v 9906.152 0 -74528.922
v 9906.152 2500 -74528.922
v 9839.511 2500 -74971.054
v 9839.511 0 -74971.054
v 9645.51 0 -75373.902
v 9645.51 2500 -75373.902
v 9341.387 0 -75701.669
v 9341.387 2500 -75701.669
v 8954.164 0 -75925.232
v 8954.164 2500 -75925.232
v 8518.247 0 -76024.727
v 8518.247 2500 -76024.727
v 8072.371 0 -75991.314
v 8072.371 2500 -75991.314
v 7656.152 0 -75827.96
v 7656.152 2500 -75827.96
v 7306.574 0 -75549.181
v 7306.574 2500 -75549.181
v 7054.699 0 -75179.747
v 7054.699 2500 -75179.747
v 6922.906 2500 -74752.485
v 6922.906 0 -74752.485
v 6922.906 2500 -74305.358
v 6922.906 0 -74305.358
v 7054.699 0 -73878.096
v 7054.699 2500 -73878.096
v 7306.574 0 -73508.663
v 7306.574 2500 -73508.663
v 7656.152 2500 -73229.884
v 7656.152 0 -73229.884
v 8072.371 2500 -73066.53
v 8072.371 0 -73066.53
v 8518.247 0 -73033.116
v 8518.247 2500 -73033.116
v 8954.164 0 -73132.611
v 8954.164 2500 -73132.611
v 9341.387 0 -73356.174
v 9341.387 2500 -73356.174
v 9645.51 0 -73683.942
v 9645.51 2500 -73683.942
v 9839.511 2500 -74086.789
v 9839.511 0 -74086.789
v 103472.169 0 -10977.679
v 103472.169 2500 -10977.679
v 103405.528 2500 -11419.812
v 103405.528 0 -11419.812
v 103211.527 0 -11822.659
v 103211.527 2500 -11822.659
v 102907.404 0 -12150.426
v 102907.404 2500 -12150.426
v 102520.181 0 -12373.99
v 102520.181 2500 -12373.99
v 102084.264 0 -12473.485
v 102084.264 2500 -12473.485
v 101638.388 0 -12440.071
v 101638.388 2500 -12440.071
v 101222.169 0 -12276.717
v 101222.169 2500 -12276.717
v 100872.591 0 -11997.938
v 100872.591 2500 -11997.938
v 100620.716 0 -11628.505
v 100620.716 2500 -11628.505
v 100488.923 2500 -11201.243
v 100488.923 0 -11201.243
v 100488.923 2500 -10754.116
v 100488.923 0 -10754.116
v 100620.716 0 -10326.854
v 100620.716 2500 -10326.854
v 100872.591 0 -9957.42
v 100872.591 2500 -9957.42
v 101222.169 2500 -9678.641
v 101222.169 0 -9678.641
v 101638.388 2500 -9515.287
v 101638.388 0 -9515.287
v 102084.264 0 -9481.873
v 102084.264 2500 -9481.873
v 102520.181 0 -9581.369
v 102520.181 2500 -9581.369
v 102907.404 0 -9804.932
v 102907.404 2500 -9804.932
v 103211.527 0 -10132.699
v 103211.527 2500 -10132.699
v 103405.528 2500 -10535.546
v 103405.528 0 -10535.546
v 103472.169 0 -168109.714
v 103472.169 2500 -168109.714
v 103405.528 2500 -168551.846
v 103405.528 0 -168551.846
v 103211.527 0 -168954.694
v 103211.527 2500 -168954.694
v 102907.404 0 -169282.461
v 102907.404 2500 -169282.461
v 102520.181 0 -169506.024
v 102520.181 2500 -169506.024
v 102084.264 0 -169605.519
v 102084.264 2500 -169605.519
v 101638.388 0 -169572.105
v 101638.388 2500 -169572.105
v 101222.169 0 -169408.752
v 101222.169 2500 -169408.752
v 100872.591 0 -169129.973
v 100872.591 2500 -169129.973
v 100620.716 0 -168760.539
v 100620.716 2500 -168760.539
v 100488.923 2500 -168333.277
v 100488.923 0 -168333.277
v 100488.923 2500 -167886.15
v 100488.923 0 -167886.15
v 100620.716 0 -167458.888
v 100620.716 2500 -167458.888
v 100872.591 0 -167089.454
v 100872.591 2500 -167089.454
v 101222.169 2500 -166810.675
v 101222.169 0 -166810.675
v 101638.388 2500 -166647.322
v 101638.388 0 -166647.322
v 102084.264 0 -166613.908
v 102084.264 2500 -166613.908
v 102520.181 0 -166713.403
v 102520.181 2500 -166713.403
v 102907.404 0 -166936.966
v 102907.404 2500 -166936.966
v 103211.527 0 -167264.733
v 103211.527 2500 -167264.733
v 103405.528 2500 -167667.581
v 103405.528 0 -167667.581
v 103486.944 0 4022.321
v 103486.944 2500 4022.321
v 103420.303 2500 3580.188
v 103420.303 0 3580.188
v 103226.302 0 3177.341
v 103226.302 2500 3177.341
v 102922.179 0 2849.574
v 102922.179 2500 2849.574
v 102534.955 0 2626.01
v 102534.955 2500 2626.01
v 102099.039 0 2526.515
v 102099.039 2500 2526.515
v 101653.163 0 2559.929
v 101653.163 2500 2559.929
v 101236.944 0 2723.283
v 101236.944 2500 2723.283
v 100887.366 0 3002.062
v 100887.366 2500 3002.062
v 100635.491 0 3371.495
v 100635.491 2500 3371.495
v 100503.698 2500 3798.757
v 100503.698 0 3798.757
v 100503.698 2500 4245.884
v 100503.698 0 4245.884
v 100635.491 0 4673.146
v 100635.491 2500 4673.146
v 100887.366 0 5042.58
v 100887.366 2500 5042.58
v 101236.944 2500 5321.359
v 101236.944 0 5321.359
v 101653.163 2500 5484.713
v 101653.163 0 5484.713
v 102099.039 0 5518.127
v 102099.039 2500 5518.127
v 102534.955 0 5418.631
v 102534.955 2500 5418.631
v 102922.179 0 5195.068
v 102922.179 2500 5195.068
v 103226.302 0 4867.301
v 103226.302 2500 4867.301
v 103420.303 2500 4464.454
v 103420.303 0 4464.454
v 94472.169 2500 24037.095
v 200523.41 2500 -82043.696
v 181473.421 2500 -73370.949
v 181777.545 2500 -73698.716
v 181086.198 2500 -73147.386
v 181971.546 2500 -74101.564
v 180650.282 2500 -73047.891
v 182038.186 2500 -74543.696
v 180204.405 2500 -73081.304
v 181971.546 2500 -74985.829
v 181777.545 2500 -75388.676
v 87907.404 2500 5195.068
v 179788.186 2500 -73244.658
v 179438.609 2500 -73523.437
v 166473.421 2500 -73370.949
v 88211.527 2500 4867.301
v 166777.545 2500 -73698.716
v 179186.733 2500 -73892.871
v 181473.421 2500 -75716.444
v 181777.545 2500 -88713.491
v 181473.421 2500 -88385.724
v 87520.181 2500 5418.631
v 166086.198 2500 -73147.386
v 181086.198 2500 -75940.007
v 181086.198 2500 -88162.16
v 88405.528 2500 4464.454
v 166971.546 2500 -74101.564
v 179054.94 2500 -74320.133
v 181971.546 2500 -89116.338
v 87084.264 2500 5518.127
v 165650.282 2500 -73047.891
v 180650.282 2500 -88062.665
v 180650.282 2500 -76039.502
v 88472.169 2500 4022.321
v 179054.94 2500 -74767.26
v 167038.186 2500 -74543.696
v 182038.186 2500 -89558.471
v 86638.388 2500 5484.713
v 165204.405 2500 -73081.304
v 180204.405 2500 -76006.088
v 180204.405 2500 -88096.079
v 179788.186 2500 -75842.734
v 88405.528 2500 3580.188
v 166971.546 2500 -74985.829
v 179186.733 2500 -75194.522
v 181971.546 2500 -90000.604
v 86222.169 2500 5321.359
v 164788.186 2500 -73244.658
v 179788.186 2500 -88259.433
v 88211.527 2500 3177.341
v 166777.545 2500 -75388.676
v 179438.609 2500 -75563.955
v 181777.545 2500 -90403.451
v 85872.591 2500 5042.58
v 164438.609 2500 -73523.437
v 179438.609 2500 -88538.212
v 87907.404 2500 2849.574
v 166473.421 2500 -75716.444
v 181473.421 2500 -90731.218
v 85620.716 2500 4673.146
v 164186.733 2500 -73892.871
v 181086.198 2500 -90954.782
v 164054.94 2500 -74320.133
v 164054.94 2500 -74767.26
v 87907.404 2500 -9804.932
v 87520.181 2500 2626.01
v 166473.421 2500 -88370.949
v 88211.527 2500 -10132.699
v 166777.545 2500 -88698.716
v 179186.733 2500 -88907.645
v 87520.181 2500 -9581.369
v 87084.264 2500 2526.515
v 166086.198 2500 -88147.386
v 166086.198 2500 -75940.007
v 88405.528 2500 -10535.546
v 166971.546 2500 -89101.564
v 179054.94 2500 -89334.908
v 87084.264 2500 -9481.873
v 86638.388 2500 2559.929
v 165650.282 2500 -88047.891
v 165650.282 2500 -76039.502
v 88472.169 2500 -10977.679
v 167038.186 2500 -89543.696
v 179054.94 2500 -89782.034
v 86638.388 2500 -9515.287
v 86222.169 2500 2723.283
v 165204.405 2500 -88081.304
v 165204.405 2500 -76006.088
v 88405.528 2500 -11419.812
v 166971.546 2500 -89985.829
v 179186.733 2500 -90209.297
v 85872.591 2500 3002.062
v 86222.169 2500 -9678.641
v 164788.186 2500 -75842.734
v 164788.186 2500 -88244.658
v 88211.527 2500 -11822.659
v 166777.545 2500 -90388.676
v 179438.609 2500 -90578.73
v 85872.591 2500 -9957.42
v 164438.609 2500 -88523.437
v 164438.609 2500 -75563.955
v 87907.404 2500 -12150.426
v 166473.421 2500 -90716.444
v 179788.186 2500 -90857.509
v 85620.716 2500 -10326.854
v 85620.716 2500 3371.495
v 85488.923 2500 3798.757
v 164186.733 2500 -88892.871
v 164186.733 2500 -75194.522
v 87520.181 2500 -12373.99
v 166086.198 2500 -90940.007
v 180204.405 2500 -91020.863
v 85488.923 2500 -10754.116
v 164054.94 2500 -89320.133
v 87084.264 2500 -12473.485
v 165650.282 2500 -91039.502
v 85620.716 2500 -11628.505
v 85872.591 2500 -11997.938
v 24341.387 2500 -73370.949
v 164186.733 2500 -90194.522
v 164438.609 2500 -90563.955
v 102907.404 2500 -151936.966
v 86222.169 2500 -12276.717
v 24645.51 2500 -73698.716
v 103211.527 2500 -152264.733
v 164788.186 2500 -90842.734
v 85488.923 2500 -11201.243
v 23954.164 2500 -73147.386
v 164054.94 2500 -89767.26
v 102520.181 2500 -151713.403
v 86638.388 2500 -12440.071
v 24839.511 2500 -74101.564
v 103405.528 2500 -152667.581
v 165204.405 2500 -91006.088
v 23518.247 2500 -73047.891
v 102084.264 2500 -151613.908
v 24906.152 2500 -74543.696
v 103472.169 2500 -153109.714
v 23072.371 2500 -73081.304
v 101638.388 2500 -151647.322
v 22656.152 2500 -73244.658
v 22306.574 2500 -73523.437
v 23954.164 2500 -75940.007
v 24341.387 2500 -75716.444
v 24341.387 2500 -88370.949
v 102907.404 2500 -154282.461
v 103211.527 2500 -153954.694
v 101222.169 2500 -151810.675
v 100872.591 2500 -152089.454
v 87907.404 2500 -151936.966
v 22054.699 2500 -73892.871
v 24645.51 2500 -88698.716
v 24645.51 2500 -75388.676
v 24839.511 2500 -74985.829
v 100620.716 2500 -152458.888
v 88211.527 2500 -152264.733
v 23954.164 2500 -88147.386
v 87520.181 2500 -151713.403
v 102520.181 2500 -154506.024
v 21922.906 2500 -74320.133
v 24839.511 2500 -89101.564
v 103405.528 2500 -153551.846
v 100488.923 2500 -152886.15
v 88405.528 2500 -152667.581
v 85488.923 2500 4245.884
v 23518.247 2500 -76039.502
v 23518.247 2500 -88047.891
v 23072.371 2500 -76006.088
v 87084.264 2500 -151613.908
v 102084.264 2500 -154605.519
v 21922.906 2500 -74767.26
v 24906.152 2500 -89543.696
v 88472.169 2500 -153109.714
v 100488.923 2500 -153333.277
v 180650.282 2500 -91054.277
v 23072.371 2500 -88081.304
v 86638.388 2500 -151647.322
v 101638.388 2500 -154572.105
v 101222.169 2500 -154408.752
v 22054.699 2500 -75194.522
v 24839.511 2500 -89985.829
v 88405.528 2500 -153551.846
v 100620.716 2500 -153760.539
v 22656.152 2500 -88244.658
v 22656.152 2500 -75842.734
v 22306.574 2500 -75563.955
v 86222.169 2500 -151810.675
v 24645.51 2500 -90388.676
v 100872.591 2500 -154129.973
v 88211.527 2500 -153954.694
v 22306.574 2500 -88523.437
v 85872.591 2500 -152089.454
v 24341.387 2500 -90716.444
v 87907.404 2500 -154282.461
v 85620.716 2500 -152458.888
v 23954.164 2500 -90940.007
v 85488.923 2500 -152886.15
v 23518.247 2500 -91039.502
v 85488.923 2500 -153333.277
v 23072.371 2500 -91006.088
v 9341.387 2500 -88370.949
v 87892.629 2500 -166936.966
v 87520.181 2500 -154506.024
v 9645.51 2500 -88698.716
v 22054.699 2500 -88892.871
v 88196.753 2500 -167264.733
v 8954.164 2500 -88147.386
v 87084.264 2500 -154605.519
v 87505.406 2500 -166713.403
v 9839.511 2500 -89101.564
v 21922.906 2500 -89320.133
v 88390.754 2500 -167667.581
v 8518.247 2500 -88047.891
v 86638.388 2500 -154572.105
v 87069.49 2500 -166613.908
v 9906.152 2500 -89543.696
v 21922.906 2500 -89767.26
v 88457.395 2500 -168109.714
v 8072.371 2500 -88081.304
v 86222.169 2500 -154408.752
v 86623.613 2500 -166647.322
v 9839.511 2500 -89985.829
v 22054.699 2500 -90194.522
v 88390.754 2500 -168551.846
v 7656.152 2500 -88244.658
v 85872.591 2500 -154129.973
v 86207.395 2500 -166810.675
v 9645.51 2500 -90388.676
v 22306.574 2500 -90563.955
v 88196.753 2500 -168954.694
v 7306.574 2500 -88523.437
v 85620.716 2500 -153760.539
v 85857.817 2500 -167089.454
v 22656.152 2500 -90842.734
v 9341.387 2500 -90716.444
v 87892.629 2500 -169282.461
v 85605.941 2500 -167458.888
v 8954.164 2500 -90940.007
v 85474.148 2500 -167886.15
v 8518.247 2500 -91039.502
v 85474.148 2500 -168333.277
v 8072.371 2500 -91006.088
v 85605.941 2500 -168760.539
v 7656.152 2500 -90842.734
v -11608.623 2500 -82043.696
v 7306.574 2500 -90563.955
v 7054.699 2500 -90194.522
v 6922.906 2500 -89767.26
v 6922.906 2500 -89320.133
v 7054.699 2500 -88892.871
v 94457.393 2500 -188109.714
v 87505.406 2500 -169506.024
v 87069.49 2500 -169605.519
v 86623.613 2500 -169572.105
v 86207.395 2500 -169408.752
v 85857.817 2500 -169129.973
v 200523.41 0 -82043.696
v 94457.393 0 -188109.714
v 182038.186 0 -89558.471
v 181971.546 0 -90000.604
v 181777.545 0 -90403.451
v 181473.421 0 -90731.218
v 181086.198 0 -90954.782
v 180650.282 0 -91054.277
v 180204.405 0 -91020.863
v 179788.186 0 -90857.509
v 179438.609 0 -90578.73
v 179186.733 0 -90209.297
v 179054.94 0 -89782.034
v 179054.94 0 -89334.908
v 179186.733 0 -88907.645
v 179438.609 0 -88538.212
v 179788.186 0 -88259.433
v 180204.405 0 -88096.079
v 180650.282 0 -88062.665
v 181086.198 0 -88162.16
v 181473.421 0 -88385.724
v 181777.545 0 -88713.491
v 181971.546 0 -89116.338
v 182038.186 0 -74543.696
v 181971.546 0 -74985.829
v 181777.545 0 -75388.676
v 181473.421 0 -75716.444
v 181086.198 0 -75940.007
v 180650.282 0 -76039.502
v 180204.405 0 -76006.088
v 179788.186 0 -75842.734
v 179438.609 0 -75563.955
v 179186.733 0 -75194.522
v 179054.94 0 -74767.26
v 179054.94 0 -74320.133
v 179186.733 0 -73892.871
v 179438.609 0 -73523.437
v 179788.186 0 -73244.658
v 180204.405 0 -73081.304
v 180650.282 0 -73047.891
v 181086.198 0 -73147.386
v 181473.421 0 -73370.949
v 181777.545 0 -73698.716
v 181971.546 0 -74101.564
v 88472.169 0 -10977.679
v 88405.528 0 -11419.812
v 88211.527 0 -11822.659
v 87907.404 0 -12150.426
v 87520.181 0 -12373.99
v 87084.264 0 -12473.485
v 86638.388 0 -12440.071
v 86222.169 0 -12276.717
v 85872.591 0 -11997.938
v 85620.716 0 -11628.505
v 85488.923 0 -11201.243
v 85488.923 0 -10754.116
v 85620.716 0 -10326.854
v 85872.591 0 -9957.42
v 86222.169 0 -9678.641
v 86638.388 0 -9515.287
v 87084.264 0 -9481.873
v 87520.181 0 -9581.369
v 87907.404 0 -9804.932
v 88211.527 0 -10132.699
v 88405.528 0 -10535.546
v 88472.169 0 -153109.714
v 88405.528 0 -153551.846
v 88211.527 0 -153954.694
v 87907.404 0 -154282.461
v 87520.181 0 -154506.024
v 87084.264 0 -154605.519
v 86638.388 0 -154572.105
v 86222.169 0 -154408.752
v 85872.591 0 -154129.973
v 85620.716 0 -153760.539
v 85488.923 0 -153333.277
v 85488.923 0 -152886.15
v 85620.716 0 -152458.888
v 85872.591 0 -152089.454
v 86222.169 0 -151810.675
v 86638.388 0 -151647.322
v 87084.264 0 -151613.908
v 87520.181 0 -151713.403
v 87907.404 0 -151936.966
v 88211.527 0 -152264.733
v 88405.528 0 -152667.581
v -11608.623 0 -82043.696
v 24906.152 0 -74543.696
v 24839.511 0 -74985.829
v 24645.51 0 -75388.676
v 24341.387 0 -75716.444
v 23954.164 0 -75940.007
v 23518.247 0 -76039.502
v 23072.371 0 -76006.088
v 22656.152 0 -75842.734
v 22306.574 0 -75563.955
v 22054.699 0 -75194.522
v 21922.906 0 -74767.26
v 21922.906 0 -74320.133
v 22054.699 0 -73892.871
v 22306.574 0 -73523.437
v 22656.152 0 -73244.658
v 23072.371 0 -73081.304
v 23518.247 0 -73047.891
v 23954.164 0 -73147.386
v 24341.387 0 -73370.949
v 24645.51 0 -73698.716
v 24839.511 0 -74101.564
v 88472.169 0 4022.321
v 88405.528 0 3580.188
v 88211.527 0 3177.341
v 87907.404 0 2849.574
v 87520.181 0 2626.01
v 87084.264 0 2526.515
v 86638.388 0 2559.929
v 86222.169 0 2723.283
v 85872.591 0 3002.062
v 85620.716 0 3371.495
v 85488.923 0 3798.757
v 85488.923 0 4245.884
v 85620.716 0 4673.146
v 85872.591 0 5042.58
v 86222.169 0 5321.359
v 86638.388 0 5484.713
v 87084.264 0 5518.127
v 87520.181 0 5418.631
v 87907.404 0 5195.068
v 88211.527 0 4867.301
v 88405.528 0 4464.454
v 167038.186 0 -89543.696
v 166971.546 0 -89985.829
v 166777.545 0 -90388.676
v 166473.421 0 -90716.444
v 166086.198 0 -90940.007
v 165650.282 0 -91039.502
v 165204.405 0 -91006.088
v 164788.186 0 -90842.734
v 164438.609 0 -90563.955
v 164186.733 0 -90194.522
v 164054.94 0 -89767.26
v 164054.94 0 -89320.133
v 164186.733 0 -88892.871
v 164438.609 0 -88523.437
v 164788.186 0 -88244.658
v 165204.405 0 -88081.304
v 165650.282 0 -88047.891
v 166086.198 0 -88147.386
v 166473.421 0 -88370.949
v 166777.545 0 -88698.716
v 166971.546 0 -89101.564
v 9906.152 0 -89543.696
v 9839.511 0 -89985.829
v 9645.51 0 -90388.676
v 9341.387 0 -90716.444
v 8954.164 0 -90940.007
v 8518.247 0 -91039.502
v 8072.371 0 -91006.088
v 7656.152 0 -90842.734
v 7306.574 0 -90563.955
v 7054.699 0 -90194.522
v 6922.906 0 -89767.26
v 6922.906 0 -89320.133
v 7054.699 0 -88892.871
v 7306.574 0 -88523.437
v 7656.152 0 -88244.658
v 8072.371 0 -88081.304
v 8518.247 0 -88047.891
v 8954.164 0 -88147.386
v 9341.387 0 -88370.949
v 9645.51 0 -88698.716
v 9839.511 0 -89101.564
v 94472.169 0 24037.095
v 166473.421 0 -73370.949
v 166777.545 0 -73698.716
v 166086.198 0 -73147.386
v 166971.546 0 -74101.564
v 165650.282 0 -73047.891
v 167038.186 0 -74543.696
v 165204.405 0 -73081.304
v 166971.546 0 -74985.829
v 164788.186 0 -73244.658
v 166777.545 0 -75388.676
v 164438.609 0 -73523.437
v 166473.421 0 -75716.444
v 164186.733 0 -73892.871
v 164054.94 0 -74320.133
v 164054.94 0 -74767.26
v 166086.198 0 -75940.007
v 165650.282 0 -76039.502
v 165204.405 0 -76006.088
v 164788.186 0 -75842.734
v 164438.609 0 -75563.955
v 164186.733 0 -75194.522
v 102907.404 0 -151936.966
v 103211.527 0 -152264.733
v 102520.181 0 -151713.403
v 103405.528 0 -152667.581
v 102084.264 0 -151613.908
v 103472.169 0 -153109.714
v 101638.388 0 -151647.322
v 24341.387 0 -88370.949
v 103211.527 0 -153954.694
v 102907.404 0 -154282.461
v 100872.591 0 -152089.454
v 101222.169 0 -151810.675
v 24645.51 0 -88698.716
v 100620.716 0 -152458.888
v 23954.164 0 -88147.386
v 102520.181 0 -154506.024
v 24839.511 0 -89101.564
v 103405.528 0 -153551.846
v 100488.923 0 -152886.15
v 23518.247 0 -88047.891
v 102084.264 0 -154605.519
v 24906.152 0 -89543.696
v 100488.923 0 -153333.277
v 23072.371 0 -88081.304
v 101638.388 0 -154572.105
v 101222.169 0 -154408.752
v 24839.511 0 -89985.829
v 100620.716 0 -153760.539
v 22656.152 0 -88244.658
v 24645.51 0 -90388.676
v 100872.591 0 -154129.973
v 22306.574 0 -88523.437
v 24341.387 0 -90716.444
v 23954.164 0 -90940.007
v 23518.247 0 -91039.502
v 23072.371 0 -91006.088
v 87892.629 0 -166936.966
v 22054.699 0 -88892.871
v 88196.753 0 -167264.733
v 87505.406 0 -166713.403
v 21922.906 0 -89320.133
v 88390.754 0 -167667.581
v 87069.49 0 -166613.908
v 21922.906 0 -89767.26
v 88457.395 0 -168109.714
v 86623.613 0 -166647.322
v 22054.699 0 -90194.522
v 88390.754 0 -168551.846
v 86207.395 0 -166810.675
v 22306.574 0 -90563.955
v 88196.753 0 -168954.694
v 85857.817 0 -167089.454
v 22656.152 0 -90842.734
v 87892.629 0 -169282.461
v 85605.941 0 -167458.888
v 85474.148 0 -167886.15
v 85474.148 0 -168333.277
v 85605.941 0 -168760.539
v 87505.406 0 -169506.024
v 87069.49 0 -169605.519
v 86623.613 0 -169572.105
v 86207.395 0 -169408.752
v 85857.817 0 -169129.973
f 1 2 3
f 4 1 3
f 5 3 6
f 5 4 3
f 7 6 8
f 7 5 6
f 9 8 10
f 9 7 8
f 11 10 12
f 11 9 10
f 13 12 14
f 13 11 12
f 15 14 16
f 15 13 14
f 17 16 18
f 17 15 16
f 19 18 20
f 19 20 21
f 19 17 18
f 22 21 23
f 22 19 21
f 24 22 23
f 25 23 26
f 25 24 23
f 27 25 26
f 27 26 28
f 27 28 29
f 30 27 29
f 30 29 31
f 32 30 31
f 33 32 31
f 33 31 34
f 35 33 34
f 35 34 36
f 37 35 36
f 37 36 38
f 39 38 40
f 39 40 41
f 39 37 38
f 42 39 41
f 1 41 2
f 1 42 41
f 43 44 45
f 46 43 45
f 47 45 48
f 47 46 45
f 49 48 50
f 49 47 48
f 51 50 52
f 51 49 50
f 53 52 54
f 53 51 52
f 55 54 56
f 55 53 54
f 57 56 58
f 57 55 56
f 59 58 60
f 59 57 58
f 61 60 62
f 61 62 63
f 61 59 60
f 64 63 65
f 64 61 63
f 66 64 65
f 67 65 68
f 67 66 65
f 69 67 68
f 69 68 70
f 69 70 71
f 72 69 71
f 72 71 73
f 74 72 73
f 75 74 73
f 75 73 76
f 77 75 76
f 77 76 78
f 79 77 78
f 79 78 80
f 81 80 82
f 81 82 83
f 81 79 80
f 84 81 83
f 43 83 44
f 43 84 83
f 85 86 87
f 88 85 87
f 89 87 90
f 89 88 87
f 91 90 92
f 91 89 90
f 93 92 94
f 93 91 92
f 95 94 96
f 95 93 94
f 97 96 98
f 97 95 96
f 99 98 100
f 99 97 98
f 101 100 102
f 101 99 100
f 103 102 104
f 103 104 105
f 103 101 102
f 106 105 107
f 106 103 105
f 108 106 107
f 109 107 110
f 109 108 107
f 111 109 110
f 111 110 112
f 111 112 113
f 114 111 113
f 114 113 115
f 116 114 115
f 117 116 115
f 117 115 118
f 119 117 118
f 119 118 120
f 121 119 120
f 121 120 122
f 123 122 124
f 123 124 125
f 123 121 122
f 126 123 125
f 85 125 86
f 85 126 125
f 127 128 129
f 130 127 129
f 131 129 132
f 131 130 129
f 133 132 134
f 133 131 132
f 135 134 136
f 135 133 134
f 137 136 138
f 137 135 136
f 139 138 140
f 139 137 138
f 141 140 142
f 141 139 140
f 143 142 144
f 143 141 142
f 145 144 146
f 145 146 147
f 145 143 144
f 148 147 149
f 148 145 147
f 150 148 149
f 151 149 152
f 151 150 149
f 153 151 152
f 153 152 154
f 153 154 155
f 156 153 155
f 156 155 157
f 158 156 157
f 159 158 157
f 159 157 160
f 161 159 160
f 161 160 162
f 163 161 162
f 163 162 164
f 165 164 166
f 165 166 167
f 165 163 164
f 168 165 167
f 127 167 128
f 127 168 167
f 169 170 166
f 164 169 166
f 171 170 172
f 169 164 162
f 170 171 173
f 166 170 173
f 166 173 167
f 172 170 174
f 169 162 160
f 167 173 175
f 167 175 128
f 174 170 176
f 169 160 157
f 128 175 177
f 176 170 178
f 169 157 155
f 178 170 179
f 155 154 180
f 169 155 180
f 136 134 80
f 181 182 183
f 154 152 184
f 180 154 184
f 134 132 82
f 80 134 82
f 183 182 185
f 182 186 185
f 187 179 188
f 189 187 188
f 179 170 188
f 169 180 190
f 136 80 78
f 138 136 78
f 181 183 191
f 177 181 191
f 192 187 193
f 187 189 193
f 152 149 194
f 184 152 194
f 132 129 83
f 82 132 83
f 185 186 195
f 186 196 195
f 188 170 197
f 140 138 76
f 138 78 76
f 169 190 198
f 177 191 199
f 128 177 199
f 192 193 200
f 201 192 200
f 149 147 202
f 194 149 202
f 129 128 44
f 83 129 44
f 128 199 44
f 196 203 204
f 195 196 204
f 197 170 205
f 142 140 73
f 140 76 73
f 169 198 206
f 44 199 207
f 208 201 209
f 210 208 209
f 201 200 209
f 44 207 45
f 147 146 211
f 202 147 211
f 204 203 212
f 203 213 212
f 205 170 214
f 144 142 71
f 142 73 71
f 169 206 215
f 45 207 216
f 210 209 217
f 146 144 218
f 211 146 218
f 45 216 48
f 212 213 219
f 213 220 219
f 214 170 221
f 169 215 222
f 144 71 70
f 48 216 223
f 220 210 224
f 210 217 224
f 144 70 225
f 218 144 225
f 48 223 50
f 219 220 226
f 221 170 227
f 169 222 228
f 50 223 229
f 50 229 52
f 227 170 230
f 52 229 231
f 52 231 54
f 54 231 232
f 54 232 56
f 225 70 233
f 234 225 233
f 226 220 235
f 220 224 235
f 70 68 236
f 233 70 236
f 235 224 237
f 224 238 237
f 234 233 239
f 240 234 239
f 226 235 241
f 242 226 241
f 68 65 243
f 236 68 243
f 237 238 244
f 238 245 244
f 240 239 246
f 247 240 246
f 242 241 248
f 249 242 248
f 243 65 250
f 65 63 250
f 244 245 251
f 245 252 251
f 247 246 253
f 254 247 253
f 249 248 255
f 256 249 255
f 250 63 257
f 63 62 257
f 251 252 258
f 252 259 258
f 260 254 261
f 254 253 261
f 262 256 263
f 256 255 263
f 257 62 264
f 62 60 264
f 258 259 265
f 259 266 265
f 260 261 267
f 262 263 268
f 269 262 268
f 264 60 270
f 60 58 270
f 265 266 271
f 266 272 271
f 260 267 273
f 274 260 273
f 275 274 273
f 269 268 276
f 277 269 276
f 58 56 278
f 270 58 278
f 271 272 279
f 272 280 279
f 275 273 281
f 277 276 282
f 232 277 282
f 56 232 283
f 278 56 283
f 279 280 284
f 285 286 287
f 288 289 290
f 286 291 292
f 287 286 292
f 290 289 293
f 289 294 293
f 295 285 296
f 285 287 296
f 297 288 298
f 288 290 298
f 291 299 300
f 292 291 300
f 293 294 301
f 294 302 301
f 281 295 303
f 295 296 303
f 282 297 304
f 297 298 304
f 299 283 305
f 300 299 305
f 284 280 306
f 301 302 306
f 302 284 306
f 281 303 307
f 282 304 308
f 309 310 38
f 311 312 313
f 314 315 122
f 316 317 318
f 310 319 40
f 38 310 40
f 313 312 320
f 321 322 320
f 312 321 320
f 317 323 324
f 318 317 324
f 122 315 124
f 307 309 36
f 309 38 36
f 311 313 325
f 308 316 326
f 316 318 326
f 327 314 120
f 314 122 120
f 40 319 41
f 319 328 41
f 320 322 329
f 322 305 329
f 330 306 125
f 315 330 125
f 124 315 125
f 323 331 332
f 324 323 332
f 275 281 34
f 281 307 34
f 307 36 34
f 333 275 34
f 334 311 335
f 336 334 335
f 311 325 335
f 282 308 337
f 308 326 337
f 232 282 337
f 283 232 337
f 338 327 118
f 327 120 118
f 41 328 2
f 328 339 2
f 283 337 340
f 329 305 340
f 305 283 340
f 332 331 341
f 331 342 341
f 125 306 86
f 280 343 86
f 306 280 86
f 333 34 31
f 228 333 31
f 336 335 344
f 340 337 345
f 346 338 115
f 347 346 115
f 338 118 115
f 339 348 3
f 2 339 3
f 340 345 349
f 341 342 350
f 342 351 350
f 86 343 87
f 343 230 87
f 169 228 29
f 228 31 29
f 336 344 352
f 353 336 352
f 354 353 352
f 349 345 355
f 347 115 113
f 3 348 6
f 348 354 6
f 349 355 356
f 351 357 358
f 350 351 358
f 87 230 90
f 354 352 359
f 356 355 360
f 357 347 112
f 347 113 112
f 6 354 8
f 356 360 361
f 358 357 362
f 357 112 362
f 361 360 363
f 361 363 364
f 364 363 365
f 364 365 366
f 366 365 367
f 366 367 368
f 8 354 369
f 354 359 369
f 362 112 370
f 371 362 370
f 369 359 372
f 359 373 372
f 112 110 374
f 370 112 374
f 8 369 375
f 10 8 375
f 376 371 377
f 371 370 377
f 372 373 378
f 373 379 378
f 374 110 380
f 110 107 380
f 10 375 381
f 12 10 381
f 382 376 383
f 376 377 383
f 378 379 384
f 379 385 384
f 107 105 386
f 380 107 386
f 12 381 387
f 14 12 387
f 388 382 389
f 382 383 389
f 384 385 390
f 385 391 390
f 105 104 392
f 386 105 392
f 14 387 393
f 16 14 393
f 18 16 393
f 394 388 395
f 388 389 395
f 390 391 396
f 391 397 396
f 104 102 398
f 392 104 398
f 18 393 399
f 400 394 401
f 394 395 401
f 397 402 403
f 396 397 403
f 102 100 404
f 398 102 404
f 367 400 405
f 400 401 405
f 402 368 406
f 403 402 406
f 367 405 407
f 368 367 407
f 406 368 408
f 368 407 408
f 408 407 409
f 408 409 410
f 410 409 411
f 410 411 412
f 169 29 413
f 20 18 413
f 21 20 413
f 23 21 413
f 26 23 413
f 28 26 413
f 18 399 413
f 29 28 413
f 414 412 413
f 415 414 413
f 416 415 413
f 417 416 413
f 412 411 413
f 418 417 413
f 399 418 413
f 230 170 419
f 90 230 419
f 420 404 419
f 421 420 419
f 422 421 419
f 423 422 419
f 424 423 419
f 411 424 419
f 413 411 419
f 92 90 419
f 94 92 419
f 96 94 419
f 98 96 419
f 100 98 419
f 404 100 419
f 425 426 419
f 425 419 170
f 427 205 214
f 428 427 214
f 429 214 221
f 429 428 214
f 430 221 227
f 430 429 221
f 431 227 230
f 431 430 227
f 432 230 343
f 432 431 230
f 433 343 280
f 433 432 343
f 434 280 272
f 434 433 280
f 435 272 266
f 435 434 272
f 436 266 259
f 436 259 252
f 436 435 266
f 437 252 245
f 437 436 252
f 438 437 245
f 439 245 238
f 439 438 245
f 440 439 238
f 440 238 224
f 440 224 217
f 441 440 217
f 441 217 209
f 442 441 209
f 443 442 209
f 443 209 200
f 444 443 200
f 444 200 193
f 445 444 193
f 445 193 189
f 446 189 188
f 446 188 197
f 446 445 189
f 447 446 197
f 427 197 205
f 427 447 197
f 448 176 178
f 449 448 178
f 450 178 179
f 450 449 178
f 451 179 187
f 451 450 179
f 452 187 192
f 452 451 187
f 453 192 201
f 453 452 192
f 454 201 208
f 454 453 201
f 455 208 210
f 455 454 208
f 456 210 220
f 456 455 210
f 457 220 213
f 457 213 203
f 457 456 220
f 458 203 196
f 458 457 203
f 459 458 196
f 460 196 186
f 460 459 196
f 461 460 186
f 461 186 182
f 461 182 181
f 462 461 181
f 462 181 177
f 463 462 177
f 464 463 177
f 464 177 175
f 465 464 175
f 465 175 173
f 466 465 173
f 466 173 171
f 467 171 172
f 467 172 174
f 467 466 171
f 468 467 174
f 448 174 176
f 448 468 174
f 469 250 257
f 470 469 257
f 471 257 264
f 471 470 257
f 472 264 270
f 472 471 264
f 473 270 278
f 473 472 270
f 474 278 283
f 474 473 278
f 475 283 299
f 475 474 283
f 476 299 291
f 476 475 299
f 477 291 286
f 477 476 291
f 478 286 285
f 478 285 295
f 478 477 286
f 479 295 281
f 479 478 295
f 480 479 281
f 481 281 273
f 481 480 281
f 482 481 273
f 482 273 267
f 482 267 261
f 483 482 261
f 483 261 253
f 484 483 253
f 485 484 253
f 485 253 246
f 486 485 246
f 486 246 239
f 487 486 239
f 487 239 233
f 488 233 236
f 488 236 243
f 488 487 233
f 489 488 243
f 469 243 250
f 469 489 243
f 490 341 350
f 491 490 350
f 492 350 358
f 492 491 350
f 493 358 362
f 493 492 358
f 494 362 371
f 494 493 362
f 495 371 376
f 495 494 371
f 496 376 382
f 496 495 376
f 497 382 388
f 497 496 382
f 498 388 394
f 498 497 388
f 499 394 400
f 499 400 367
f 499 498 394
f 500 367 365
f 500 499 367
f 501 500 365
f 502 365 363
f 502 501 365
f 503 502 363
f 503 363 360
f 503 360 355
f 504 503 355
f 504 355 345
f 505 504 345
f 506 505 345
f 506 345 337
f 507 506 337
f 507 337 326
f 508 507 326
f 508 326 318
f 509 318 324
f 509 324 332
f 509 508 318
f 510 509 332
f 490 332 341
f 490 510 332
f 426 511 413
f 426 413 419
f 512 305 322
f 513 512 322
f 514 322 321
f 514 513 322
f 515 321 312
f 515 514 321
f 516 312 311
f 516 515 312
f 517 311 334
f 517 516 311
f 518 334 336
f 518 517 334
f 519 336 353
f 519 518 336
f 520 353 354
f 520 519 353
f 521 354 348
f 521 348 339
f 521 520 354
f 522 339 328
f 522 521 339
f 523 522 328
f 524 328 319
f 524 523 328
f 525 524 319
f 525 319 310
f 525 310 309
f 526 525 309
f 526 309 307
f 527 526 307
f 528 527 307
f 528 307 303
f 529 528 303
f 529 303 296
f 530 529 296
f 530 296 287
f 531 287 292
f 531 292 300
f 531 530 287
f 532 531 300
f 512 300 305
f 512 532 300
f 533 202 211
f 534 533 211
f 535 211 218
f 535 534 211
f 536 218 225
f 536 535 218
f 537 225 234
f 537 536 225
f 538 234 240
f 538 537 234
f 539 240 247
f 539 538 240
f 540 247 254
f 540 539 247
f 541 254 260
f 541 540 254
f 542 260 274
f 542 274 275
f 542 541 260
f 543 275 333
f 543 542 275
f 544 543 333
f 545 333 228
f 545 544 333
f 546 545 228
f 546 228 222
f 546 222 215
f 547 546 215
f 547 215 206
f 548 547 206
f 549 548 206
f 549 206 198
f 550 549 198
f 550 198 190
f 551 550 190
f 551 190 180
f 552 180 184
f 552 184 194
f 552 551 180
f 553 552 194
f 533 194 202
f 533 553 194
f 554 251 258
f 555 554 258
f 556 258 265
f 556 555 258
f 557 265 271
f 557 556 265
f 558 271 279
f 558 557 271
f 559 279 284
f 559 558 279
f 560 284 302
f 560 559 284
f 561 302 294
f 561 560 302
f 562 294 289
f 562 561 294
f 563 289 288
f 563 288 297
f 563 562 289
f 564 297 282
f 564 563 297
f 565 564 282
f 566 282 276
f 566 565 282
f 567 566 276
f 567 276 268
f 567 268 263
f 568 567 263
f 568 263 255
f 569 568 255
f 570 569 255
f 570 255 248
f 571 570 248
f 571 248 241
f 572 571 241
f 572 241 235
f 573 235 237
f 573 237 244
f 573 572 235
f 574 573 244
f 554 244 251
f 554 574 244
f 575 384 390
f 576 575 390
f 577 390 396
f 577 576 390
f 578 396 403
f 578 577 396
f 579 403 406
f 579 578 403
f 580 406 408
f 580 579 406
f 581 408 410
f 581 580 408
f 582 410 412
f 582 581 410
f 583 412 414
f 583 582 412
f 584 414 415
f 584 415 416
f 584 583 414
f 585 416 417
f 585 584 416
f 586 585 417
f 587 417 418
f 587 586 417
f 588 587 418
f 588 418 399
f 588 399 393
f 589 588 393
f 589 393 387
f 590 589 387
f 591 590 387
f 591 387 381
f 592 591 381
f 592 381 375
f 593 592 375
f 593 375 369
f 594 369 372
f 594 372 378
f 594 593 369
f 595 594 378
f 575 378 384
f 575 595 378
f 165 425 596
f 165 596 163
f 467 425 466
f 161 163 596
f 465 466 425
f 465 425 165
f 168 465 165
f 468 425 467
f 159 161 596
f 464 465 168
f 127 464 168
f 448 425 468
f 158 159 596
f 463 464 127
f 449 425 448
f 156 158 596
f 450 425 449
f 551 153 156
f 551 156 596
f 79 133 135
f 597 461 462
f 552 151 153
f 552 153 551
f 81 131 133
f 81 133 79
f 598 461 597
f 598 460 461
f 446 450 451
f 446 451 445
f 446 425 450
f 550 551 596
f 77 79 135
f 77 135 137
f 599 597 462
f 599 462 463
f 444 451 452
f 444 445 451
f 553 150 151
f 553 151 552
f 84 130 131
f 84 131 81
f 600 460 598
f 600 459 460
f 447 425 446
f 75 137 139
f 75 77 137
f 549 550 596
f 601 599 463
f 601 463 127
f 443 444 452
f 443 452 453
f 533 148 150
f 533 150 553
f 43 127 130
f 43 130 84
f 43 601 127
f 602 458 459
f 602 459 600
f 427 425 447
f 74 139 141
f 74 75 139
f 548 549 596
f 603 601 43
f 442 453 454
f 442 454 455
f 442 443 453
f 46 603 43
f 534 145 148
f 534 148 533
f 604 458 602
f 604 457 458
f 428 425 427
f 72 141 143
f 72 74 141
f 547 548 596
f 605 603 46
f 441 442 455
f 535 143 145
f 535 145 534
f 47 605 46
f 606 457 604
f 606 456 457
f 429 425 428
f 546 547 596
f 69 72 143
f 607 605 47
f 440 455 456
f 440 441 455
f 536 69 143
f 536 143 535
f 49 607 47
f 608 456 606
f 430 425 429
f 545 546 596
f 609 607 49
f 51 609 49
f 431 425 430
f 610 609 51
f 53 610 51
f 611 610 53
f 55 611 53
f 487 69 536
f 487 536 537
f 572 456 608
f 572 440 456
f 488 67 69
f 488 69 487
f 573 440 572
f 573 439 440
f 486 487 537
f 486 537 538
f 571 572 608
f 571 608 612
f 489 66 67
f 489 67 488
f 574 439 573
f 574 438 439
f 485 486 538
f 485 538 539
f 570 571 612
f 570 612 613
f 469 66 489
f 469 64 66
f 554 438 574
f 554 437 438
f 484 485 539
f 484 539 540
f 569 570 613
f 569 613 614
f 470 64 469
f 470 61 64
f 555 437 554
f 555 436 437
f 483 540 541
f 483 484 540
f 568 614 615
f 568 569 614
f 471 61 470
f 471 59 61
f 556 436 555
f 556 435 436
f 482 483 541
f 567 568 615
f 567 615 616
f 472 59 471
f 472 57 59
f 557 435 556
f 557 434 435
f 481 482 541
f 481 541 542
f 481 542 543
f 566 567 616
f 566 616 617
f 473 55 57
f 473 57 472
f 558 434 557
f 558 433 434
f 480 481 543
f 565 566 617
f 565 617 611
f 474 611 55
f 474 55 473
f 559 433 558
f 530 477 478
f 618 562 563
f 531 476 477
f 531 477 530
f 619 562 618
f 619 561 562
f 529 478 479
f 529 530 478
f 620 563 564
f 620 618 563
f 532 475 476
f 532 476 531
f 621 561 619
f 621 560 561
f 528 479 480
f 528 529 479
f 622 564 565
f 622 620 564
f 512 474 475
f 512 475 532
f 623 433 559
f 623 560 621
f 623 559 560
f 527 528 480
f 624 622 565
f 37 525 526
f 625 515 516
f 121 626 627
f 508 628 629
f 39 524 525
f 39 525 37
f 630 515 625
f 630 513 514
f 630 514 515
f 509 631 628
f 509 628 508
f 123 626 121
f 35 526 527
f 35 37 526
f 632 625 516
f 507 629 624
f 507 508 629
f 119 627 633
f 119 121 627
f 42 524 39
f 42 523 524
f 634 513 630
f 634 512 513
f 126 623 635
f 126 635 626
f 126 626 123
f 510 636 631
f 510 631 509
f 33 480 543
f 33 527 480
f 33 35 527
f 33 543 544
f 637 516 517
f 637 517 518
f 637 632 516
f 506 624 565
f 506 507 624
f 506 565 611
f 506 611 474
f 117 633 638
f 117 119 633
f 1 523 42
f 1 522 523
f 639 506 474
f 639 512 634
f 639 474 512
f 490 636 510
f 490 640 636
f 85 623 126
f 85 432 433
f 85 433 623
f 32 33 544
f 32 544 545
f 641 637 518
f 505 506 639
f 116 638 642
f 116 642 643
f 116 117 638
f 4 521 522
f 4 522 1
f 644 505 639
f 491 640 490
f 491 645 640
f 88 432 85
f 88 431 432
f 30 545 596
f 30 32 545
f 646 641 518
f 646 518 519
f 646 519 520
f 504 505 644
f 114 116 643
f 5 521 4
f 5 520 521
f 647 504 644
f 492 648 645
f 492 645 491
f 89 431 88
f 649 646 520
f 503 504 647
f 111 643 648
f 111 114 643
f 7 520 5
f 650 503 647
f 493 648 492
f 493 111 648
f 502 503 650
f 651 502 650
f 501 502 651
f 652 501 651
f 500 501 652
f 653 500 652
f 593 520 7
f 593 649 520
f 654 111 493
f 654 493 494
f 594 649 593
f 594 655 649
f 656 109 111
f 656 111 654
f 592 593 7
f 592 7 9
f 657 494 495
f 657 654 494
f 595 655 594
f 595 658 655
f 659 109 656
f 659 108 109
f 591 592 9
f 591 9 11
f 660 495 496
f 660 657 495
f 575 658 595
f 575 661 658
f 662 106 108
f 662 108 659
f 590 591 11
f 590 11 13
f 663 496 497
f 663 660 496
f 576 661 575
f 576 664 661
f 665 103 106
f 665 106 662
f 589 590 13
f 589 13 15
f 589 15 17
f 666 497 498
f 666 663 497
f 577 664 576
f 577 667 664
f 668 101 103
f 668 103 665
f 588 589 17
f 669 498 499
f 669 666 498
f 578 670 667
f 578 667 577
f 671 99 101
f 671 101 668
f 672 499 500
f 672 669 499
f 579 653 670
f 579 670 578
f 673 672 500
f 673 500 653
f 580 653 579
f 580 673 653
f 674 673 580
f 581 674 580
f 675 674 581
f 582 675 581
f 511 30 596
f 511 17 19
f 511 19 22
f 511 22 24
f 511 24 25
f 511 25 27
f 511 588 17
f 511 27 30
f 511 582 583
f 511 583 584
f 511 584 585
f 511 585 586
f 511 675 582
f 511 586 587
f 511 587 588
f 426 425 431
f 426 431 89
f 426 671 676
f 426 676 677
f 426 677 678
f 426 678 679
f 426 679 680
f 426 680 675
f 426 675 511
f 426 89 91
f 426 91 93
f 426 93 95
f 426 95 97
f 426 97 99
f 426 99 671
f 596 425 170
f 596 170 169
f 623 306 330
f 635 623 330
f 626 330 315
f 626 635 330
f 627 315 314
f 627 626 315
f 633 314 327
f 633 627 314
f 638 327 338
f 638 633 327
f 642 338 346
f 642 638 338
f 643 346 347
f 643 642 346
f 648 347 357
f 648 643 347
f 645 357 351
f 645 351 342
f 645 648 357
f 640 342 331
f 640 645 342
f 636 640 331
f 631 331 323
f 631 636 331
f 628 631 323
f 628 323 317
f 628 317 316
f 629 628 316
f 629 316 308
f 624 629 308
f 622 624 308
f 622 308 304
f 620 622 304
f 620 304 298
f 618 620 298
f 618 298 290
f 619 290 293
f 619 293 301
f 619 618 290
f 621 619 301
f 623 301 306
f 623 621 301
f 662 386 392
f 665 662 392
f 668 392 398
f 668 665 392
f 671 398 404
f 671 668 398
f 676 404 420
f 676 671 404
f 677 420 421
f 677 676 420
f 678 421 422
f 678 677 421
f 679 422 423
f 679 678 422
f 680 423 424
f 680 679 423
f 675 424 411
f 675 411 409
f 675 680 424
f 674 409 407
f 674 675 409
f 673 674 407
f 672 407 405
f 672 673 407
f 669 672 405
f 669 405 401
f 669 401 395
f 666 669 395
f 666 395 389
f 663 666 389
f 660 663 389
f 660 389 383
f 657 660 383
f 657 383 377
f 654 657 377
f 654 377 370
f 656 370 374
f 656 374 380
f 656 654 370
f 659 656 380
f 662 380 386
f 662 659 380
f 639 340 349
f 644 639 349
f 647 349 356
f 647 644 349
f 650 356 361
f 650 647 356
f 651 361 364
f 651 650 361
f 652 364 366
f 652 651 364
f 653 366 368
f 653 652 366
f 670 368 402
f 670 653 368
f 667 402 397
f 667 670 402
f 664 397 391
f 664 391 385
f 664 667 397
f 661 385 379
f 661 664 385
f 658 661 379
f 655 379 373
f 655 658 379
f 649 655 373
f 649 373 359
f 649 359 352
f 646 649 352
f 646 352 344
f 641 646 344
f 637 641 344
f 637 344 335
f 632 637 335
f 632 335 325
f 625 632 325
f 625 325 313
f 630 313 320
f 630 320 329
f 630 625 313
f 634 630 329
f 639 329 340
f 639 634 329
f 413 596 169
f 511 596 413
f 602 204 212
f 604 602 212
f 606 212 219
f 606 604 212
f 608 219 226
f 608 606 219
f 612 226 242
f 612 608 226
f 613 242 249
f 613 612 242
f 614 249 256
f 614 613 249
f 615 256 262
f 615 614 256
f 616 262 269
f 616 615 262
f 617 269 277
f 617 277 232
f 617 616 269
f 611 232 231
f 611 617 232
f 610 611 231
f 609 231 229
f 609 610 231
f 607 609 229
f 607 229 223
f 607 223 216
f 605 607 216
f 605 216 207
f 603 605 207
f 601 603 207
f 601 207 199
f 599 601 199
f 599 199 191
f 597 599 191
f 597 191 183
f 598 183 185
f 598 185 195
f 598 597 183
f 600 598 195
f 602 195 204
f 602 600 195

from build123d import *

# Parameters (mm, degrees)
SKETCH3_R           = 1500
BOSS_EXTRUDE2_DEPTH = 2500


with BuildPart() as part:
    # Sketch3 → Boss-Extrude2 (new body)
    with BuildSketch(Plane(origin=(0, 0, 0), x_dir=(1, 0, 0), z_dir=(0, 1, 0))):
        Polygon((94457.392609736, 188109.713508362), (200523.409787719, 82043.696330379), (94472.169284797, -24037.095464325), (-11608.622509908, 82043.696330379), align=None)
        with Locations((23406.152106819, 74543.696330375)):
            Circle(SKETCH3_R, mode=Mode.SUBTRACT)
        with Locations((8406.152106819, 89543.696330375)):
            Circle(SKETCH3_R, mode=Mode.SUBTRACT)
        with Locations((8406.152106819, 74528.921713652)):
            Circle(SKETCH3_R, mode=Mode.SUBTRACT)
        with Locations((101972.169284806, 10977.679152396)):
            Circle(SKETCH3_R, mode=Mode.SUBTRACT)
        with Locations((86972.169284806, -4022.320847604)):
            Circle(SKETCH3_R, mode=Mode.SUBTRACT)
        with Locations((101986.943901529, -4022.320847604)):
            Circle(SKETCH3_R, mode=Mode.SUBTRACT)
        with Locations((165538.186462784, 89543.696330384)):
            Circle(SKETCH3_R, mode=Mode.SUBTRACT)
        with Locations((180538.186462784, 74543.696330384)):
            Circle(SKETCH3_R, mode=Mode.SUBTRACT)
        with Locations((180538.186462784, 89558.470947106)):
            Circle(SKETCH3_R, mode=Mode.SUBTRACT)
        with Locations((23406.152106818, 89543.696330376)):
            Circle(SKETCH3_R, mode=Mode.SUBTRACT)
        with Locations((86972.169284804, 10977.679152397)):
            Circle(SKETCH3_R, mode=Mode.SUBTRACT)
        with Locations((165538.186462783, 74543.696330383)):
            Circle(SKETCH3_R, mode=Mode.SUBTRACT)
        with Locations((86972.169284797, 153109.713508362)):
            Circle(SKETCH3_R, mode=Mode.SUBTRACT)
        with Locations((101972.169284797, 153109.713508362)):
            Circle(SKETCH3_R, mode=Mode.SUBTRACT)
        with Locations((101972.169284797, 168109.713508362)):
            Circle(SKETCH3_R, mode=Mode.SUBTRACT)
        with Locations((86957.394668074, 168109.713508362)):
            Circle(SKETCH3_R, mode=Mode.SUBTRACT)
    extrude(amount=BOSS_EXTRUDE2_DEPTH)


solid = part.part
